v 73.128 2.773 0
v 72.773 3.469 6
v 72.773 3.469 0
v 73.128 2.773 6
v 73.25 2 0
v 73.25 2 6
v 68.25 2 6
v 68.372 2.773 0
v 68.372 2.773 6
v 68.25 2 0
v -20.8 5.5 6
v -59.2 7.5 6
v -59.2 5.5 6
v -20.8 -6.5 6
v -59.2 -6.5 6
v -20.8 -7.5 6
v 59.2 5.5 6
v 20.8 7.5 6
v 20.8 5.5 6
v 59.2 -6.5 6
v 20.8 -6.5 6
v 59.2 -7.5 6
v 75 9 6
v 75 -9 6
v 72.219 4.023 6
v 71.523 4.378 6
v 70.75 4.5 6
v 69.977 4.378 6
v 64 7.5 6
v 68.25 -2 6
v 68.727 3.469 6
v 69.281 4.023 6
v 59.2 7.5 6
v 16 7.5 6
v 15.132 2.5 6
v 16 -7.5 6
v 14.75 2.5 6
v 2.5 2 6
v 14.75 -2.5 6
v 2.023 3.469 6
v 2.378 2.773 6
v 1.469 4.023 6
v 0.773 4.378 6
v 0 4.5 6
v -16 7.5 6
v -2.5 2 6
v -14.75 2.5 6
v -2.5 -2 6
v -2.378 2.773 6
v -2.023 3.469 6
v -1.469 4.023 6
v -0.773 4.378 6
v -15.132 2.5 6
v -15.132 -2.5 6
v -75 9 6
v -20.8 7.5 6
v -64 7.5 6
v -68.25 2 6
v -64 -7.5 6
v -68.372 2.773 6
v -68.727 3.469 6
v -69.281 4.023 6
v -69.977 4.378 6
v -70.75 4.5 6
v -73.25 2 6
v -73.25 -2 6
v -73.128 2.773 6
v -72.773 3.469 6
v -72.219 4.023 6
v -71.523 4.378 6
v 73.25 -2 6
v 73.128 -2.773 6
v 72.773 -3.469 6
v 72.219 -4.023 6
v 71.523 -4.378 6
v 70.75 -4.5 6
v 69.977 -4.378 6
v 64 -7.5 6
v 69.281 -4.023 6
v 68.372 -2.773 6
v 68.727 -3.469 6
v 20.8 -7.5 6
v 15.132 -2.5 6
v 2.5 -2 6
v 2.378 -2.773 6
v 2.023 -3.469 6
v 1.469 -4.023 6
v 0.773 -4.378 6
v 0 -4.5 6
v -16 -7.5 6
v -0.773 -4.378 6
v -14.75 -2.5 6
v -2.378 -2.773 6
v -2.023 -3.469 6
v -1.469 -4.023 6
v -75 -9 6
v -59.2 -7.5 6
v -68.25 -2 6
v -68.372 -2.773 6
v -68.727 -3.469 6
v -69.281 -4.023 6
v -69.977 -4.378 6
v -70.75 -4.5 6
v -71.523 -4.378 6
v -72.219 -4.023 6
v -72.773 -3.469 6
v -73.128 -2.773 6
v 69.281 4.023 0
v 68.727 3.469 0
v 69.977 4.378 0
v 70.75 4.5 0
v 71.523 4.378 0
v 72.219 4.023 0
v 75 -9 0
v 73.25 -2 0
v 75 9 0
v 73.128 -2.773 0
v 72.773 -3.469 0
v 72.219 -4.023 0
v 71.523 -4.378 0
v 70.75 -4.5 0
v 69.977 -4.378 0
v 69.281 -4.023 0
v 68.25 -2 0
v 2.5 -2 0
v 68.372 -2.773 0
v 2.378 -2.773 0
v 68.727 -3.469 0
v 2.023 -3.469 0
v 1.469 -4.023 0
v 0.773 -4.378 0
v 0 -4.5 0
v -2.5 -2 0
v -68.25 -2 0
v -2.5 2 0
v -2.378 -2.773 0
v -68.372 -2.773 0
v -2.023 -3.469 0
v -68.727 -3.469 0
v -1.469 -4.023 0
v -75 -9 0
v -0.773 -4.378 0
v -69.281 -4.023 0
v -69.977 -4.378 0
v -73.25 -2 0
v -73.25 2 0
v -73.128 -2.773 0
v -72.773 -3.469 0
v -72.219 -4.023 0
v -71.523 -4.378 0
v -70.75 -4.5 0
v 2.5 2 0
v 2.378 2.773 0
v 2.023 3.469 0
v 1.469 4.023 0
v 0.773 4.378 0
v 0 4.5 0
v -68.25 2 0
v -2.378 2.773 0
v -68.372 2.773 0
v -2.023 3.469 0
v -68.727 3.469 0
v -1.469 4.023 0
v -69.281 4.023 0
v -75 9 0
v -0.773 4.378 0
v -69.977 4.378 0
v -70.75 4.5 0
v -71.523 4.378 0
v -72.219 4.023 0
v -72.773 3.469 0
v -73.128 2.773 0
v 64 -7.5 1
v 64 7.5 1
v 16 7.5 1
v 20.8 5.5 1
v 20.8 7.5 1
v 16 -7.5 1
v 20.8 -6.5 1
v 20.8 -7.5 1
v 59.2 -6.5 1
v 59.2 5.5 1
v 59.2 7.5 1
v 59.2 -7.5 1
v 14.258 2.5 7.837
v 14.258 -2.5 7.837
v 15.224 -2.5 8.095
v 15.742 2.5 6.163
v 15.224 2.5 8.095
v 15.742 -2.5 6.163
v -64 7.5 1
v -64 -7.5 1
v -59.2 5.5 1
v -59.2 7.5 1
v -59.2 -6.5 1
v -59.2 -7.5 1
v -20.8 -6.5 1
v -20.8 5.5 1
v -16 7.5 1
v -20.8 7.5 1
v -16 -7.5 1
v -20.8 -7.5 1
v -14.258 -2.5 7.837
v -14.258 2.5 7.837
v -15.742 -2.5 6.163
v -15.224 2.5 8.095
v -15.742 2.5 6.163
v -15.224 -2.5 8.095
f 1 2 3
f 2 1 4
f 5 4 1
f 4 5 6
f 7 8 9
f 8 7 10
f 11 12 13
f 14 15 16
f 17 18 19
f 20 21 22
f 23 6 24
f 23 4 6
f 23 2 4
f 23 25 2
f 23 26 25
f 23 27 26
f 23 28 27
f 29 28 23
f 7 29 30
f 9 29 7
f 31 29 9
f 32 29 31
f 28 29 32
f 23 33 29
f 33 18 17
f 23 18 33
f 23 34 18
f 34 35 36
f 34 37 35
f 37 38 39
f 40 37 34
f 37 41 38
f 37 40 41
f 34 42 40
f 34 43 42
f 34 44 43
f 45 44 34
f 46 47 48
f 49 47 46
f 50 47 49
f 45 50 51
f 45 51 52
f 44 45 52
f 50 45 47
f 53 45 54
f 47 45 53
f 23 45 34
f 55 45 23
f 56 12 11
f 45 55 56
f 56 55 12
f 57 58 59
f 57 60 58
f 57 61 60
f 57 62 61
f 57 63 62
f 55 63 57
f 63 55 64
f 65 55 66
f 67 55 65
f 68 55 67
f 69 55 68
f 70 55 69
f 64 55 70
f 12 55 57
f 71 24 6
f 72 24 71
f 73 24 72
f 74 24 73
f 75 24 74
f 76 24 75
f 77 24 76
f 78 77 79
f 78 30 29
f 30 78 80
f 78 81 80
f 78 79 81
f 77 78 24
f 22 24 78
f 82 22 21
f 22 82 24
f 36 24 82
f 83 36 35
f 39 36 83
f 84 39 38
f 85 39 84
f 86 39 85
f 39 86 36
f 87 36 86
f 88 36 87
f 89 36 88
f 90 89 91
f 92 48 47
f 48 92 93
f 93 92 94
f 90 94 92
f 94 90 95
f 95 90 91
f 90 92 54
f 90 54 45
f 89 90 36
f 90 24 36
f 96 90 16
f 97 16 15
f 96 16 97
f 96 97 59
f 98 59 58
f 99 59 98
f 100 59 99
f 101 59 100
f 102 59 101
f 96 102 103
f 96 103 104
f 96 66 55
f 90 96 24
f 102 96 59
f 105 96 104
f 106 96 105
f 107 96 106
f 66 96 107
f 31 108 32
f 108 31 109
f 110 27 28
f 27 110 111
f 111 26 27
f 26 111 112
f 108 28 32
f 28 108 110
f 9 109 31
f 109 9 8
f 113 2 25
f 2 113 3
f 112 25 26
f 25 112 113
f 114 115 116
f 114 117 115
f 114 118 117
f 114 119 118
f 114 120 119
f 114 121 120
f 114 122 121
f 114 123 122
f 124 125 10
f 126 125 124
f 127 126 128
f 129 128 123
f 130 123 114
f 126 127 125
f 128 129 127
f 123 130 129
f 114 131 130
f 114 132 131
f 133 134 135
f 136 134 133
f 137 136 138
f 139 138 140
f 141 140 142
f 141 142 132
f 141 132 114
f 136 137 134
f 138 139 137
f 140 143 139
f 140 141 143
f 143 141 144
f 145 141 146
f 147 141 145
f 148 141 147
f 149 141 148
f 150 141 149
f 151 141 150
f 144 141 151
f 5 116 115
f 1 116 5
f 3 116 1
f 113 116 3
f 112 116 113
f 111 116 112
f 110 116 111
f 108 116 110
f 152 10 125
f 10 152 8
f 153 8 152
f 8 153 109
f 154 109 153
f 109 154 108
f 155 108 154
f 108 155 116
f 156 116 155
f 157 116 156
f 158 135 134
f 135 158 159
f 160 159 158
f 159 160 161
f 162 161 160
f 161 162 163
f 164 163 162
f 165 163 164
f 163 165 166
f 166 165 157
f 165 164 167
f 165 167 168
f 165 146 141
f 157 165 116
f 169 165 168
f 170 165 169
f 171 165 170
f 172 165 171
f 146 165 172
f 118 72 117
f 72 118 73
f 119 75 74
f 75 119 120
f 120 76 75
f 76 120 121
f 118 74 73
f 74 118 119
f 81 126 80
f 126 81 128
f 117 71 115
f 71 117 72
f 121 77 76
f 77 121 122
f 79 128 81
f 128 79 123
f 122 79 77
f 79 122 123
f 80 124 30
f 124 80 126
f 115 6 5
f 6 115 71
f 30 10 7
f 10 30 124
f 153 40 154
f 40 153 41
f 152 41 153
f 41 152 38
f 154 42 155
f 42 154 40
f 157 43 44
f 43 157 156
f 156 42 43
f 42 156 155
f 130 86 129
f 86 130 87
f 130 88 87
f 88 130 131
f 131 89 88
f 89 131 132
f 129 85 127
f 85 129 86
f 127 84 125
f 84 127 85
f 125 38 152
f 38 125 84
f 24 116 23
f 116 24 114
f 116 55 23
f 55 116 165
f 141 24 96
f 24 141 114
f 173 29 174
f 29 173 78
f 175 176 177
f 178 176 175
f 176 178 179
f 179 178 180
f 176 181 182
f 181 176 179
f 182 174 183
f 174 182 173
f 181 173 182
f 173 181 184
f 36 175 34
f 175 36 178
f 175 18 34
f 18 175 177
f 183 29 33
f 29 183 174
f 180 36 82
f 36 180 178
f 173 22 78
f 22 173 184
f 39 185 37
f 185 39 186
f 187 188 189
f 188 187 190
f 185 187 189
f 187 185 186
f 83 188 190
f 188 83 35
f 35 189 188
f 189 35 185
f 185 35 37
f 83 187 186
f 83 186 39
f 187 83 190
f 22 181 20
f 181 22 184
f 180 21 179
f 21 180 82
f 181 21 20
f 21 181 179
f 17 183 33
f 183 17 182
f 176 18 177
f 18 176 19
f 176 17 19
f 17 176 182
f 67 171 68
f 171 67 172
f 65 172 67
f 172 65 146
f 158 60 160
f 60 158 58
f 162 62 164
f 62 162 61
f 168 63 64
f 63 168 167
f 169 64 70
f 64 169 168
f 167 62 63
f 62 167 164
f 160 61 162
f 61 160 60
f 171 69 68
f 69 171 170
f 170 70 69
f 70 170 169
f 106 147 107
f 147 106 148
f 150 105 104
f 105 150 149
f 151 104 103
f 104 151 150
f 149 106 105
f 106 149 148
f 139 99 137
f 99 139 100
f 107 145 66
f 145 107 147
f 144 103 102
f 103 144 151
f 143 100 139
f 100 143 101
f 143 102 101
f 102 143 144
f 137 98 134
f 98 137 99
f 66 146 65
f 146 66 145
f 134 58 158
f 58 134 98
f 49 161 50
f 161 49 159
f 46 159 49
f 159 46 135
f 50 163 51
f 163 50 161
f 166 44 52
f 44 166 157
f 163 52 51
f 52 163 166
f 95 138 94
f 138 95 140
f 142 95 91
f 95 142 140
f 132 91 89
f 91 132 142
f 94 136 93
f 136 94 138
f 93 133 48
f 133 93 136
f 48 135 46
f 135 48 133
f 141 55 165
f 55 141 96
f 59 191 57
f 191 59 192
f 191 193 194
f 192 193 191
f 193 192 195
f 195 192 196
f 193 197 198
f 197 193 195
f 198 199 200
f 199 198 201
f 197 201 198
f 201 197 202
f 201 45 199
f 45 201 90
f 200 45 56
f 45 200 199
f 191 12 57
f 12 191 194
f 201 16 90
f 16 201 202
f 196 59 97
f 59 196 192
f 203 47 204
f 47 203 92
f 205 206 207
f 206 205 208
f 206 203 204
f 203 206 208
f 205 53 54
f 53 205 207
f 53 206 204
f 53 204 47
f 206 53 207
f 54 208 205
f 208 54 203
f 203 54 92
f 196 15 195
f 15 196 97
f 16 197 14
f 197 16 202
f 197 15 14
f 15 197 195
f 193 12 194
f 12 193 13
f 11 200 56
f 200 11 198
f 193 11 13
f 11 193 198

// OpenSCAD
module long_hole(position, radius, length, depth, fn) {
    translate(position + [0, length / 2, depth / 2]) cylinder(r=radius, h=depth, $fn=fn, center=true);
    translate(position + [0, -length / 2, depth / 2]) cylinder(r=radius, h=depth, $fn=fn, center=true);
    translate(position + [0, 0, depth / 2]) cube([2 * radius, length, depth], center=true);
}

module half_plate(size, cavity_size, offset, cavity, thickenings) {
    module default_long_hole(position) {
        long_hole(position=position, radius=2.5, length=4, depth=size[2], fn=20);
    }

    difference() {
        translate([0, -size[1] / 2, 0]) cube (size);
        translate([offset, -cavity[1] / 2, size[2] - cavity[2]]) cube (cavity);
        default_long_hole([size[0] - 4.25, 0, 0]);
        default_long_hole([0, 0, 0]);
    }
    translate([offset - 1, 0, size[2] + 1]) rotate([0, -15, 0]) cube([1, 5, 2], center=true);

    // thickening
    translate([offset + (cavity[0] - .8 * cavity[0]) / 2, -cavity[1] / 2, 0]) {
        cube([.8 * cavity[0], thickenings[0], size[2]]);
    }
    translate([offset + (cavity[0] - .8 * cavity[0]) / 2, cavity[1] / 2 - thickenings[1], 0]) {
        cube([.8 * cavity[0], thickenings[1], size[2]]);
    }
}

module full_plate(size, offset, cavity, thickenings) {
    half_plate([size[0] / 2, size[1], size[2]], offset=offset, cavity=cavity, thickenings=thickenings);
    mirror([1, 0 ,0]) {
        half_plate([size[0] / 2, size[1], size[2]], offset=offset, cavity=cavity, thickenings=thickenings);
    }
}

full_plate([150, 18, 6], offset=16, cavity=[48, 15, 5], thickenings=[1, 2]);
